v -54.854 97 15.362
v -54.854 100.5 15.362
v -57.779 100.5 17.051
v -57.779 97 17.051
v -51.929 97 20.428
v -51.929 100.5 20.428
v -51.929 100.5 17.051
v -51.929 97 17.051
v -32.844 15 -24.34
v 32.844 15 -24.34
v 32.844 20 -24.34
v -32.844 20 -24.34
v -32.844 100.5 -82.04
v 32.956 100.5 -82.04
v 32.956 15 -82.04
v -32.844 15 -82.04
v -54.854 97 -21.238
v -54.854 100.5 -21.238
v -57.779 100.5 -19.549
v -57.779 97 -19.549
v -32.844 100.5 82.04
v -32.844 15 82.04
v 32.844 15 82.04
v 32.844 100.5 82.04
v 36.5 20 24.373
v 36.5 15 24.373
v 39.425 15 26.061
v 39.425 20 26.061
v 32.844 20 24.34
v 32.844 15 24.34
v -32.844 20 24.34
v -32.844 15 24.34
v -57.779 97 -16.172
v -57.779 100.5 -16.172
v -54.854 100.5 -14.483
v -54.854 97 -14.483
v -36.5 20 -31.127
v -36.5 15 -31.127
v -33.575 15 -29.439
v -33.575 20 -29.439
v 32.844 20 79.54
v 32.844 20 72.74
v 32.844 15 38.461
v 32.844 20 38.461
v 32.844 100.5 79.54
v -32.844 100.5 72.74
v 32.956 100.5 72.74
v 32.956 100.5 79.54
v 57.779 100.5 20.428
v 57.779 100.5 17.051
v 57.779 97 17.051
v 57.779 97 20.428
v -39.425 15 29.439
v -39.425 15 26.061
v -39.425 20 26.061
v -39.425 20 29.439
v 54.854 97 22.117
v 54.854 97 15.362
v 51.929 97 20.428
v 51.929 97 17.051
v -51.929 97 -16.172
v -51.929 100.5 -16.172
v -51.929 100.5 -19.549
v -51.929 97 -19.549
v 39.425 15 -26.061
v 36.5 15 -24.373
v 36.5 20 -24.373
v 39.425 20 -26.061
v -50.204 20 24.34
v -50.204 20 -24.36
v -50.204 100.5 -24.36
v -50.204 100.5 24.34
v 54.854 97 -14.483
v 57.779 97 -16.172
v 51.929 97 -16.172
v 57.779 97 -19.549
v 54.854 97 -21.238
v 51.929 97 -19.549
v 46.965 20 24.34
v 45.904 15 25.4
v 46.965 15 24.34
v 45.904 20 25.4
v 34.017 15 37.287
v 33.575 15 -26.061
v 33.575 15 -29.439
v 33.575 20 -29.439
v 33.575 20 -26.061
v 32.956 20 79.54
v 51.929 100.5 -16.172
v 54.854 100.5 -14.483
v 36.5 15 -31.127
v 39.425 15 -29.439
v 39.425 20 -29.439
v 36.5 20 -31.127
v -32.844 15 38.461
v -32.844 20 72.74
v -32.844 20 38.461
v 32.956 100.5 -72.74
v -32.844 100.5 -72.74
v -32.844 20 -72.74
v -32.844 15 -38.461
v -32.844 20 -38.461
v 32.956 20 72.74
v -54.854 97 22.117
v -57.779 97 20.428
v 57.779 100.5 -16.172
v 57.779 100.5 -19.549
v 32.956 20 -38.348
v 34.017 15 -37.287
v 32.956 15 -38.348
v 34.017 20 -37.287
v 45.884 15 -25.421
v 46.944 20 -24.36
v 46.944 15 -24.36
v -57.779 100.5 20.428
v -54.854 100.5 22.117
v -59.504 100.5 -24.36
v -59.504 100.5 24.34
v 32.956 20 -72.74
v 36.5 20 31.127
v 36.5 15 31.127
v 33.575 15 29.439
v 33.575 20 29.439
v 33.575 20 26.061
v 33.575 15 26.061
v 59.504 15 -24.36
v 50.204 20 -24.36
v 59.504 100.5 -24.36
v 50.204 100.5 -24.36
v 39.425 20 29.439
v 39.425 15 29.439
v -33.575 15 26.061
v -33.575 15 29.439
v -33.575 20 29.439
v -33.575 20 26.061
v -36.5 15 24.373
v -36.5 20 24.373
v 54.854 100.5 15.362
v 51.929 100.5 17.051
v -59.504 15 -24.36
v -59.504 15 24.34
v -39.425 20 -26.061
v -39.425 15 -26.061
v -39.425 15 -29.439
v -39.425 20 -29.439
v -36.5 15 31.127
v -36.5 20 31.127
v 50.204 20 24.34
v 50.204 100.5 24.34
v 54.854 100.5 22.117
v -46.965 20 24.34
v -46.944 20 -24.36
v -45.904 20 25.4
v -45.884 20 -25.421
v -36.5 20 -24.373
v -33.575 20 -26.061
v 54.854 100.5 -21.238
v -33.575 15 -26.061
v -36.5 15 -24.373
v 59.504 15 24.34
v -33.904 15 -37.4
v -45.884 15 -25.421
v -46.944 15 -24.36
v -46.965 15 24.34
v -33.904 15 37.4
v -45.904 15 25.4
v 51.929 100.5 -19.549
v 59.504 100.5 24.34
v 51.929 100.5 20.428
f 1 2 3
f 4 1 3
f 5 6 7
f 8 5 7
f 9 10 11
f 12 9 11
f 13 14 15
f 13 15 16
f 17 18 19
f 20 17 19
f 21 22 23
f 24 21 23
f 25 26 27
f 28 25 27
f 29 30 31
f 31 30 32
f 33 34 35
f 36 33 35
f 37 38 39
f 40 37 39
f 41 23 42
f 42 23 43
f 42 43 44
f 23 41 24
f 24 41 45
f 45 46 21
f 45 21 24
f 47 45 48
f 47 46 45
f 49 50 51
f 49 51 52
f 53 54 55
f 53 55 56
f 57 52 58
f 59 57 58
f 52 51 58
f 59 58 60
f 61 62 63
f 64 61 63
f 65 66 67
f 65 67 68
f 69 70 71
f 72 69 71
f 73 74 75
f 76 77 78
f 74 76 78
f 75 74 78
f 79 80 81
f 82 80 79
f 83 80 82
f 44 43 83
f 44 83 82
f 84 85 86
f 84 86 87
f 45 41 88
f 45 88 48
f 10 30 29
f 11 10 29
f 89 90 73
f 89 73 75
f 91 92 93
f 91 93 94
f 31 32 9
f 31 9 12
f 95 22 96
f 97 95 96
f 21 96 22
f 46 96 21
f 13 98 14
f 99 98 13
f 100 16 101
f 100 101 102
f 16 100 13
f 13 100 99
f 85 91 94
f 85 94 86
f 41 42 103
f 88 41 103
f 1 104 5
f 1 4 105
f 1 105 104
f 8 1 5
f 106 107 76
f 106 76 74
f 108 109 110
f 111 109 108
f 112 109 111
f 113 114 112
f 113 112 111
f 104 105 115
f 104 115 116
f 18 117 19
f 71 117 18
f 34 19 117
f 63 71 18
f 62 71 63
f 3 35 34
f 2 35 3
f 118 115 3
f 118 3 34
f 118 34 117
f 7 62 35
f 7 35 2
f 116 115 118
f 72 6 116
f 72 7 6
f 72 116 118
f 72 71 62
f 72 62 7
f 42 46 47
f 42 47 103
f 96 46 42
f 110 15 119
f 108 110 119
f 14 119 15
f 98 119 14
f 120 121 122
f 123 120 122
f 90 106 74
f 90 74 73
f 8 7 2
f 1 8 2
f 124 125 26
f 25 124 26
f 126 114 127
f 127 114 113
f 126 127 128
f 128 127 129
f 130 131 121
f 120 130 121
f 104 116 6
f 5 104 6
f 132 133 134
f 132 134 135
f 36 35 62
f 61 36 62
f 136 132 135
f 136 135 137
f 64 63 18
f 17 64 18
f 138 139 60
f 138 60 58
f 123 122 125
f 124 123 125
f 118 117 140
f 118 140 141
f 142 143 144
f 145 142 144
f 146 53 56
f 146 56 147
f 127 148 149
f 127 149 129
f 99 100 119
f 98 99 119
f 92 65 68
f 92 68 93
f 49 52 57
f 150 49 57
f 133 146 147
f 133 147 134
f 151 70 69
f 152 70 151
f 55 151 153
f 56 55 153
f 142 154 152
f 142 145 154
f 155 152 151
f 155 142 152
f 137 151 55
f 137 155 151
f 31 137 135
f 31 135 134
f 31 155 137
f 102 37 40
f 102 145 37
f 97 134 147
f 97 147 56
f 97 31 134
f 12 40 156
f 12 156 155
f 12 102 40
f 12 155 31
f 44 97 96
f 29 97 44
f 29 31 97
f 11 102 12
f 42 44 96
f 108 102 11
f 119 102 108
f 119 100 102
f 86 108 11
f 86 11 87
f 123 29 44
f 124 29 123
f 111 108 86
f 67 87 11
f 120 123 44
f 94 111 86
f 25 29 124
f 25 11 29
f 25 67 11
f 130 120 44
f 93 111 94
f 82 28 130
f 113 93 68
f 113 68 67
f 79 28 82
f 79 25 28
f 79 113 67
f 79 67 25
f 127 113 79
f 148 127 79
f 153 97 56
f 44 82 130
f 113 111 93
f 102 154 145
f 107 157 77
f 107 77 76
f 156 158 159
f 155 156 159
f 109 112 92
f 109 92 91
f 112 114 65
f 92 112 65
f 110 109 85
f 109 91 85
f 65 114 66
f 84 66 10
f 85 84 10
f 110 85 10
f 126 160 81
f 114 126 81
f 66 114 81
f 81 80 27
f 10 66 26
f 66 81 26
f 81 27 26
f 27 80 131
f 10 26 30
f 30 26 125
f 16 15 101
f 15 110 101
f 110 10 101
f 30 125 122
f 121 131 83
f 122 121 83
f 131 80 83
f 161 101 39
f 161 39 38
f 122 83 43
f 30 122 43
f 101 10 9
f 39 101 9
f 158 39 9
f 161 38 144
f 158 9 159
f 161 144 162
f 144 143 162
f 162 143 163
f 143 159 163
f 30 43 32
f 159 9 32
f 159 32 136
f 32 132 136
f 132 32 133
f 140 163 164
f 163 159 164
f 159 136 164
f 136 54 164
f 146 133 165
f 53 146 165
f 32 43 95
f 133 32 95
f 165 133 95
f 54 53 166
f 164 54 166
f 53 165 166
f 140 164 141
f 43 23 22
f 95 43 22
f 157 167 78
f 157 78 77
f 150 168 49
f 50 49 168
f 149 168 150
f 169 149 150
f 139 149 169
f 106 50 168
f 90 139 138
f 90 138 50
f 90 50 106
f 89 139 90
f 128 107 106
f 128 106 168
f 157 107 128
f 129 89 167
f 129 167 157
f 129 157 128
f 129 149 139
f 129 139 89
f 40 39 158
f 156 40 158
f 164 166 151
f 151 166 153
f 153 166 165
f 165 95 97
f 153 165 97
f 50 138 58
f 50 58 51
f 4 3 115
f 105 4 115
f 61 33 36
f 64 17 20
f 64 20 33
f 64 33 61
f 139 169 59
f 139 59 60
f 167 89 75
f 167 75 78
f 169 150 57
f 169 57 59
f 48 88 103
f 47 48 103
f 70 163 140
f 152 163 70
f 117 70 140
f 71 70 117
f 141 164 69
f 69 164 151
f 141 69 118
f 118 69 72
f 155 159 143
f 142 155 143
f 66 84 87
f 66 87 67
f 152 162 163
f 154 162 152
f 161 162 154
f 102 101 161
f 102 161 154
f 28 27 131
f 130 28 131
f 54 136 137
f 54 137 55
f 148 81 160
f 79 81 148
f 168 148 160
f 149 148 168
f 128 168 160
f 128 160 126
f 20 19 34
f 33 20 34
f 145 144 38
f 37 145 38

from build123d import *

# Parameters (mm, degrees)
BOSS_EXTRUDE1_DEPTH   = 20
BOSS_EXTRUDE1_2_DEPTH = 20
BOSS_EXTRUDE1_3_DEPTH = 20
BOSS_EXTRUDE1_4_DEPTH = 20
SKETCH6_W             = 12
SKETCH6_H             = 5
BOSS_EXTRUDE5_DEPTH   = 65.8
SKETCH7_W             = 12
SKETCH7_H             = 5
BOSS_EXTRUDE6_DEPTH   = 48.7
SKETCH8_W             = 12.175
SKETCH8_H             = 5
BOSS_EXTRUDE7_DEPTH   = 12.16
SKETCH9_W             = 12.175
SKETCH9_H             = 5
BOSS_EXTRUDE8_DEPTH   = 12.16
SKETCH11_W            = 6.8
SKETCH11_H            = 12.175
BOSS_EXTRUDE9_DEPTH   = 80.5
SKETCH14_W            = 12.175
SKETCH14_H            = 5
BOSS_EXTRUDE12_DEPTH  = 43.2
SKETCH15_W            = 12.175
SKETCH15_H            = 5
BOSS_EXTRUDE13_DEPTH  = 43.2
SKETCH16_W            = 12.175
SKETCH16_H            = 6.8
BOSS_EXTRUDE14_DEPTH  = 80.5
SKETCH17_W            = 16.970562748
SKETCH17_H            = 15
CUT_EXTRUDE1_DEPTH    = 10
SKETCH18_W            = 16.970562748
SKETCH18_H            = 15
CUT_EXTRUDE2_DEPTH    = 10
SKETCH19_W            = 16.970562748
SKETCH19_H            = 15
CUT_EXTRUDE3_DEPTH    = 10
SKETCH20_W            = 16.970562748
SKETCH20_H            = 15
CUT_EXTRUDE4_DEPTH    = 10
BOSS_EXTRUDE15_DEPTH  = 50
BOSS_EXTRUDE16_DEPTH  = 30
SKETCH26_W            = 16.970562748
SKETCH26_H            = 5
BOSS_EXTRUDE17_DEPTH  = 1.5
SKETCH27_W            = 1.5
SKETCH27_H            = 5
BOSS_EXTRUDE18_DEPTH  = 2.5
SKETCH28_W            = 1.5
SKETCH28_H            = 5
BOSS_EXTRUDE20_DEPTH  = 2.5
SKETCH29_W            = 16.810915376
SKETCH29_H            = 5
BOSS_EXTRUDE21_DEPTH  = 1.5
SKETCH30_W            = 1.5
SKETCH30_H            = 5
BOSS_EXTRUDE22_DEPTH  = 3.5
SKETCH31_W            = 1.5
SKETCH31_H            = 5
BOSS_EXTRUDE23_DEPTH  = 3.5
SKETCH32_W            = 16.781669725
SKETCH32_H            = 5
BOSS_EXTRUDE24_DEPTH  = 1.5
SKETCH33_W            = 1.5
SKETCH33_H            = 5
BOSS_EXTRUDE25_DEPTH  = 2.5
SKETCH34_W            = 1.5
SKETCH34_H            = 5
BOSS_EXTRUDE26_DEPTH  = 2.5
SKETCH35_W            = 16.941317097
SKETCH35_H            = 5
BOSS_EXTRUDE27_DEPTH  = 1.5
SKETCH36_W            = 1.5
SKETCH36_H            = 5
BOSS_EXTRUDE28_DEPTH  = 2.5
SKETCH38_W            = 1.5
SKETCH38_H            = 5
BOSS_EXTRUDE29_DEPTH  = 2.5
SKETCH43_W            = 48.7
SKETCH43_H            = 85.5
BOSS_EXTRUDE30_DEPTH  = 2.5
SKETCH44_W            = 48.7
SKETCH44_H            = 85.5
BOSS_EXTRUDE31_DEPTH  = 2.5
SKETCH45_W            = 65.68711226
SKETCH45_H            = 85.5
BOSS_EXTRUDE32_DEPTH  = 2.5
SKETCH46_W            = 65.8
SKETCH46_H            = 85.5
BOSS_EXTRUDE33_DEPTH  = 2.5
CUT_EXTRUDE5_DEPTH    = 3.5


with BuildPart() as part:
    # Sketch2 → Boss-Extrude1 (new body)
    with BuildSketch(Plane(origin=(0, 0, 0), x_dir=(1, 0, 0), z_dir=(0, 1, 0))):
        Polygon((-32.84355613, 36.339660101), (-32.84355613, 24.339660101), (-44.84355613, 24.339660101), align=None)
        Polygon((-33.575, 29.438749537), (-33.575, 26.061250463), (-36.5, 24.372500925), (-39.425, 26.061250463), (-39.425, 29.438749537), (-36.5, 31.127499075), align=None, mode=Mode.SUBTRACT)
    extrude(amount=BOSS_EXTRUDE1_DEPTH)



with BuildPart() as body_2:
    # Sketch2 → Boss-Extrude1 2 (new body)
    with BuildSketch(Plane(origin=(0, 0, 0), x_dir=(1, 0, 0), z_dir=(0, 1, 0))):
        Polygon((32.84355613, 24.339660101), (44.84355613, 24.339660101), (32.84355613, 36.339660101), align=None)
        Polygon((33.575, 29.438749537), (33.575, 26.061250463), (36.5, 24.372500925), (39.425, 26.061250463), (39.425, 29.438749537), (36.5, 31.127499075), align=None, mode=Mode.SUBTRACT)
    extrude(amount=BOSS_EXTRUDE1_2_DEPTH)


with BuildPart() as body_3:
    # Sketch2 → Boss-Extrude1 3 (new body)
    with BuildSketch(Plane(origin=(0, 0, 0), x_dir=(1, 0, 0), z_dir=(0, 1, 0))):
        Polygon((44.84355613, -24.339660101), (32.84355613, -36.339660101), (32.84355613, -24.339660101), align=None)
        Polygon((39.425, -26.061250463), (39.425, -29.438749537), (36.5, -31.127499075), (33.575, -29.438749537), (33.575, -26.061250463), (36.5, -24.372500925), align=None, mode=Mode.SUBTRACT)
    extrude(amount=BOSS_EXTRUDE1_3_DEPTH)


with BuildPart() as body_4:
    # Sketch2 → Boss-Extrude1 4 (new body)
    with BuildSketch(Plane(origin=(0, 0, 0), x_dir=(1, 0, 0), z_dir=(0, 1, 0))):
        Polygon((-44.84355613, -24.339660101), (-32.84355613, -36.339660101), (-32.84355613, -24.339660101), align=None)
        Polygon((-36.5, -31.127499075), (-33.575, -29.438749537), (-33.575, -26.061250463), (-36.5, -24.372500925), (-39.425, -26.061250463), (-39.425, -29.438749537), align=None, mode=Mode.SUBTRACT)
    extrude(amount=BOSS_EXTRUDE1_4_DEPTH)


with BuildPart() as part_1:
    add(part.part)

    add(body_2.part)  # Boss-Extrude5 merges body 2

    add(body_3.part)  # Boss-Extrude5 merges body 3

    add(body_4.part)  # Boss-Extrude5 merges body 4
    # Sketch6 → Boss-Extrude5 (add)
    with BuildSketch(Plane(origin=(-32.84355613, 0, 0), x_dir=(0, 0, -1), z_dir=(1, 0, 0))):
        with Locations((30.339660101, 17.5)):
            Rectangle(SKETCH6_W, SKETCH6_H)
        with Locations((-30.339660101, 17.5)):
            Rectangle(SKETCH6_W, SKETCH6_H)
    extrude(amount=BOSS_EXTRUDE5_DEPTH)

    # Sketch7 → Boss-Extrude6 (add)
    with BuildSketch(Plane(origin=(0, 0, 24.339660101), x_dir=(-1, 0, 0), z_dir=(0, 0, -1))):
        with Locations((-38.84355613, 17.5)):
            Rectangle(SKETCH7_W, SKETCH7_H)
        with Locations((38.84355613, 17.5)):
            Rectangle(SKETCH7_W, SKETCH7_H)
    extrude(amount=BOSS_EXTRUDE6_DEPTH)

    # Sketch8 → Boss-Extrude7 (add)
    with BuildSketch(Plane(origin=(44.84355613, 0, 0), x_dir=(0, 0, -1), z_dir=(1, 0, 0))):
        with Locations((-18.252160101, 17.5)):
            Rectangle(SKETCH8_W, SKETCH8_H)
        with Locations((18.272839899, 17.5)):
            Rectangle(SKETCH8_W, SKETCH8_H)
    extrude(amount=BOSS_EXTRUDE7_DEPTH)

    # Sketch9 → Boss-Extrude8 (add)
    with BuildSketch(Plane.ZY.offset(44.84355613)):
        with Locations((-18.272839899, 17.5)):
            Rectangle(SKETCH9_W, SKETCH9_H)
        with Locations((18.252160101, 17.5)):
            Rectangle(SKETCH9_W, SKETCH9_H)
    extrude(amount=BOSS_EXTRUDE8_DEPTH)

    # Sketch11 → Boss-Extrude9 (add)
    with BuildSketch(Plane(origin=(0, 20, 0), x_dir=(1, 0, 0), z_dir=(0, 1, 0))):
        with Locations((-53.60355613, -18.252160101)):
            Rectangle(SKETCH11_W, SKETCH11_H)
        with Locations((-53.60355613, 18.272839899)):
            Rectangle(SKETCH11_W, SKETCH11_H)
        with Locations((53.60355613, 18.272839899)):
            Rectangle(SKETCH11_W, SKETCH11_H)
        with Locations((53.60355613, -18.252160101)):
            Rectangle(SKETCH11_W, SKETCH11_H)
    extrude(amount=BOSS_EXTRUDE9_DEPTH)

    # Sketch14 → Boss-Extrude12 (add)
    with BuildSketch(Plane.XY.offset(36.339660101)):
        with Locations((-26.75605613, 17.5)):
            Rectangle(SKETCH14_W, SKETCH14_H)
        with Locations((26.75605613, 17.5)):
            Rectangle(SKETCH14_W, SKETCH14_H)
    extrude(amount=BOSS_EXTRUDE12_DEPTH)

    # Sketch15 → Boss-Extrude13 (add)
    with BuildSketch(Plane(origin=(0, 0, -36.339660101), x_dir=(-1, 0, 0), z_dir=(0, 0, -1))):
        with Locations((-26.86894387, 17.5)):
            Rectangle(SKETCH15_W, SKETCH15_H)
        with Locations((26.75605613, 17.5)):
            Rectangle(SKETCH15_W, SKETCH15_H)
    extrude(amount=BOSS_EXTRUDE13_DEPTH)

    # Sketch16 → Boss-Extrude14 (add)
    with BuildSketch(Plane(origin=(0, 20, 0), x_dir=(1, 0, 0), z_dir=(0, 1, 0))):
        with Locations((-26.75605613, 76.139660101)):
            Rectangle(SKETCH16_W, SKETCH16_H)
        with Locations((26.86894387, 76.139660101)):
            Rectangle(SKETCH16_W, SKETCH16_H)
        with Locations((26.86894387, -76.139660101)):
            Rectangle(SKETCH16_W, SKETCH16_H)
        with Locations((-26.75605613, -76.139660101)):
            Rectangle(SKETCH16_W, SKETCH16_H)
    extrude(amount=BOSS_EXTRUDE14_DEPTH)

    # Sketch17 → Cut-Extrude1 (cut)
    with BuildSketch(Plane(origin=(34.591608116, 0, -34.591608116), x_dir=(-0.707106781, 0, -0.707106781), z_dir=(0.707106781, 0, -0.707106781))):
        with Locations((-6.013162549, 7.5)):
            Rectangle(SKETCH17_W, SKETCH17_H)
    extrude(amount=-CUT_EXTRUDE1_DEPTH, mode=Mode.SUBTRACT)

    # Sketch18 → Cut-Extrude2 (cut)
    with BuildSketch(Plane(origin=(-34.591608116, 0, -34.591608116), x_dir=(-0.707106781, 0, 0.707106781), z_dir=(-0.707106781, 0, -0.707106781))):
        with Locations((6.013162549, 7.5)):
            Rectangle(SKETCH18_W, SKETCH18_H)
    extrude(amount=-CUT_EXTRUDE2_DEPTH, mode=Mode.SUBTRACT)

    # Sketch19 → Cut-Extrude3 (cut)
    with BuildSketch(Plane(origin=(-34.591608116, 0, 34.591608116), x_dir=(0.707106781, 0, 0.707106781), z_dir=(-0.707106781, 0, 0.707106781))):
        with Locations((-6.013162549, 7.5)):
            Rectangle(SKETCH19_W, SKETCH19_H)
    extrude(amount=-CUT_EXTRUDE3_DEPTH, mode=Mode.SUBTRACT)

    # Sketch20 → Cut-Extrude4 (cut)
    with BuildSketch(Plane(origin=(34.591608116, 0, 34.591608116), x_dir=(0.707106781, 0, -0.707106781), z_dir=(0.707106781, 0, 0.707106781))):
        with Locations((6.013162549, 7.5)):
            Rectangle(SKETCH20_W, SKETCH20_H)
    extrude(amount=-CUT_EXTRUDE4_DEPTH, mode=Mode.SUBTRACT)

    # Sketch21 → Boss-Extrude15 (add)
    with BuildSketch(Plane(origin=(-20.66855613, 0, 0), x_dir=(0, 0, -1), z_dir=(1, 0, 0))):
        Polygon((-79.539660101, 100.5), (-72.739660101, 100.5), (-72.739660101, 20), (-36.339660101, 20), (-36.339660101, 15), (-79.539660101, 15), align=None)
        Polygon((79.539660101, 100.5), (72.739660101, 100.5), (72.739660101, 20), (36.339660101, 20), (36.339660101, 15), (79.539660101, 15), align=None)
    extrude(amount=BOSS_EXTRUDE15_DEPTH)

    # Sketch25 → Boss-Extrude16 (add)
    with BuildSketch(Plane.XY.offset(-12.185339899)):
        Polygon((-50.20355613, 100.5), (-57.00355613, 100.5), (-57.00355613, 15), (-44.84355613, 15), (-44.84355613, 20), (-50.20355613, 20), align=None)
        Polygon((50.20355613, 100.5), (57.00355613, 100.5), (57.00355613, 15), (44.84355613, 15), (44.84355613, 20), (50.20355613, 20), align=None)
    extrude(amount=BOSS_EXTRUDE16_DEPTH)

    # Sketch26 → Boss-Extrude17 (add)
    with BuildSketch(Plane(origin=(-34.591608116, 0, 34.591608116), x_dir=(0.707106781, 0, 0.707106781), z_dir=(-0.707106781, 0, 0.707106781))):
        with Locations((-6.013162549, 17.5)):
            Rectangle(SKETCH26_W, SKETCH26_H)
    extrude(amount=BOSS_EXTRUDE17_DEPTH)

    # Sketch27 → Boss-Extrude18 (add)
    with BuildSketch(Plane(origin=(1.748051985, 0, 1.748051985), x_dir=(0.707106781, 0, -0.707106781), z_dir=(0.707106781, 0, 0.707106781))):
        with Locations((-49.669921341, 17.5)):
            Rectangle(SKETCH27_W, SKETCH27_H)
    extrude(amount=BOSS_EXTRUDE18_DEPTH)

    # Sketch28 → Boss-Extrude20 (add)
    with BuildSketch(Plane(origin=(-10.251948015, 0, -10.251948015), x_dir=(-0.707106781, 0, 0.707106781), z_dir=(-0.707106781, 0, -0.707106781))):
        with Locations((49.669921341, 17.5)):
            Rectangle(SKETCH28_W, SKETCH28_H)
    extrude(amount=BOSS_EXTRUDE20_DEPTH)

    # Sketch29 → Boss-Extrude21 (add)
    with BuildSketch(Plane(origin=(34.591608116, 0, 34.591608116), x_dir=(0.707106781, 0, -0.707106781), z_dir=(0.707106781, 0, 0.707106781))):
        with Locations((6.092986235, 17.5)):
            Rectangle(SKETCH29_W, SKETCH29_H)
    extrude(amount=BOSS_EXTRUDE21_DEPTH)

    # Sketch30 → Boss-Extrude22 (add)
    with BuildSketch(Plane(origin=(-1.635164246, 0, 1.635164246), x_dir=(0.707106781, 0, 0.707106781), z_dir=(-0.707106781, 0, 0.707106781))):
        with Locations((49.669921341, 17.5)):
            Rectangle(SKETCH30_W, SKETCH30_H)
    extrude(amount=BOSS_EXTRUDE22_DEPTH)

    # Sketch31 → Boss-Extrude23 (add)
    with BuildSketch(Plane(origin=(10.251948015, 0, -10.251948015), x_dir=(-0.707106781, 0, -0.707106781), z_dir=(0.707106781, 0, -0.707106781))):
        with Locations((-49.669921341, 17.5)):
            Rectangle(SKETCH31_W, SKETCH31_H)
    extrude(amount=BOSS_EXTRUDE23_DEPTH)

    # Sketch32 → Boss-Extrude24 (add)
    with BuildSketch(Plane(origin=(34.591608116, 0, -34.591608116), x_dir=(-0.707106781, 0, -0.707106781), z_dir=(0.707106781, 0, -0.707106781))):
        with Locations((-6.07836341, 17.5)):
            Rectangle(SKETCH32_W, SKETCH32_H)
    extrude(amount=BOSS_EXTRUDE24_DEPTH)

    # Sketch33 → Boss-Extrude25 (add)
    with BuildSketch(Plane(origin=(10.231268217, 0, 10.231268217), x_dir=(0.707106781, 0, -0.707106781), z_dir=(0.707106781, 0, 0.707106781))):
        with Locations((49.669921341, 17.5)):
            Rectangle(SKETCH33_W, SKETCH33_H)
    extrude(amount=BOSS_EXTRUDE25_DEPTH)

    # Sketch34 → Boss-Extrude26 (add)
    with BuildSketch(Plane(origin=(-1.635164246, 0, -1.635164246), x_dir=(-0.707106781, 0, 0.707106781), z_dir=(-0.707106781, 0, -0.707106781))):
        with Locations((-49.669921341, 17.5)):
            Rectangle(SKETCH34_W, SKETCH34_H)
    extrude(amount=BOSS_EXTRUDE26_DEPTH)

    # Sketch35 → Boss-Extrude27 (add)
    with BuildSketch(Plane(origin=(-34.591608116, 0, -34.591608116), x_dir=(-0.707106781, 0, 0.707106781), z_dir=(-0.707106781, 0, -0.707106781))):
        with Locations((5.998539724, 17.5)):
            Rectangle(SKETCH35_W, SKETCH35_H)
    extrude(amount=BOSS_EXTRUDE27_DEPTH)

    # Sketch36 → Boss-Extrude28 (add)
    with BuildSketch(Plane(origin=(1.748051985, 0, -1.748051985), x_dir=(-0.707106781, 0, -0.707106781), z_dir=(0.707106781, 0, -0.707106781))):
        with Locations((49.669921341, 17.5)):
            Rectangle(SKETCH36_W, SKETCH36_H)
    extrude(amount=BOSS_EXTRUDE28_DEPTH)

    # Sketch38 → Boss-Extrude29 (add)
    with BuildSketch(Plane(origin=(-10.231268217, 0, 10.231268217), x_dir=(0.707106781, 0, 0.707106781), z_dir=(-0.707106781, 0, 0.707106781))):
        with Locations((-49.669921341, 17.5)):
            Rectangle(SKETCH38_W, SKETCH38_H)
    extrude(amount=BOSS_EXTRUDE29_DEPTH)

    # Sketch43 → Boss-Extrude30 (add)
    with BuildSketch(Plane.ZY.offset(57.00355613)):
        with Locations((-0.010339899, 57.75)):
            Rectangle(SKETCH43_W, SKETCH43_H)
    extrude(amount=BOSS_EXTRUDE30_DEPTH)

    # Sketch44 → Boss-Extrude31 (add)
    with BuildSketch(Plane(origin=(57.00355613, 0, 0), x_dir=(0, 0, -1), z_dir=(1, 0, 0))):
        with Locations((0.010339899, 57.75)):
            Rectangle(SKETCH44_W, SKETCH44_H)
    extrude(amount=BOSS_EXTRUDE31_DEPTH)

    # Sketch45 → Boss-Extrude32 (add)
    with BuildSketch(Plane.XY.offset(79.539660101)):
        with Locations((0, 57.75)):
            Rectangle(SKETCH45_W, SKETCH45_H)
    extrude(amount=BOSS_EXTRUDE32_DEPTH)

    # Sketch46 → Boss-Extrude33 (add)
    with BuildSketch(Plane(origin=(0, 0, -79.539660101), x_dir=(-1, 0, 0), z_dir=(0, 0, -1))):
        with Locations((-0.05644387, 57.75)):
            Rectangle(SKETCH46_W, SKETCH46_H)
    extrude(amount=BOSS_EXTRUDE33_DEPTH)

    # Sketch47 → Cut-Extrude5 (cut)
    with BuildSketch(Plane(origin=(0, 100.5, 0), x_dir=(1, 0, 0), z_dir=(0, 1, 0))):
        Polygon((-54.85355613, -22.116831472), (-51.92855613, -20.428081935), (-51.92855613, -17.05058286), (-54.85355613, -15.361833323), (-57.77855613, -17.05058286), (-57.77855613, -20.428081935), align=None)
        Polygon((57.77855613, 16.171590362), (54.85355613, 14.482840824), (51.92855613, 16.171590362), (51.92855613, 19.549089436), (54.85355613, 21.237838974), (57.77855613, 19.549089436), align=None)
        Polygon((-54.85355613, 14.482840824), (-51.92855613, 16.171590362), (-51.92855613, 19.549089436), (-54.85355613, 21.237838974), (-57.77855613, 19.549089436), (-57.77855613, 16.171590362), align=None)
        Polygon((57.77855613, -20.428081935), (54.85355613, -22.116831472), (51.92855613, -20.428081935), (51.92855613, -17.05058286), (54.85355613, -15.361833323), (57.77855613, -17.05058286), align=None)
    extrude(amount=-CUT_EXTRUDE5_DEPTH, mode=Mode.SUBTRACT)


solid = part_1.part
